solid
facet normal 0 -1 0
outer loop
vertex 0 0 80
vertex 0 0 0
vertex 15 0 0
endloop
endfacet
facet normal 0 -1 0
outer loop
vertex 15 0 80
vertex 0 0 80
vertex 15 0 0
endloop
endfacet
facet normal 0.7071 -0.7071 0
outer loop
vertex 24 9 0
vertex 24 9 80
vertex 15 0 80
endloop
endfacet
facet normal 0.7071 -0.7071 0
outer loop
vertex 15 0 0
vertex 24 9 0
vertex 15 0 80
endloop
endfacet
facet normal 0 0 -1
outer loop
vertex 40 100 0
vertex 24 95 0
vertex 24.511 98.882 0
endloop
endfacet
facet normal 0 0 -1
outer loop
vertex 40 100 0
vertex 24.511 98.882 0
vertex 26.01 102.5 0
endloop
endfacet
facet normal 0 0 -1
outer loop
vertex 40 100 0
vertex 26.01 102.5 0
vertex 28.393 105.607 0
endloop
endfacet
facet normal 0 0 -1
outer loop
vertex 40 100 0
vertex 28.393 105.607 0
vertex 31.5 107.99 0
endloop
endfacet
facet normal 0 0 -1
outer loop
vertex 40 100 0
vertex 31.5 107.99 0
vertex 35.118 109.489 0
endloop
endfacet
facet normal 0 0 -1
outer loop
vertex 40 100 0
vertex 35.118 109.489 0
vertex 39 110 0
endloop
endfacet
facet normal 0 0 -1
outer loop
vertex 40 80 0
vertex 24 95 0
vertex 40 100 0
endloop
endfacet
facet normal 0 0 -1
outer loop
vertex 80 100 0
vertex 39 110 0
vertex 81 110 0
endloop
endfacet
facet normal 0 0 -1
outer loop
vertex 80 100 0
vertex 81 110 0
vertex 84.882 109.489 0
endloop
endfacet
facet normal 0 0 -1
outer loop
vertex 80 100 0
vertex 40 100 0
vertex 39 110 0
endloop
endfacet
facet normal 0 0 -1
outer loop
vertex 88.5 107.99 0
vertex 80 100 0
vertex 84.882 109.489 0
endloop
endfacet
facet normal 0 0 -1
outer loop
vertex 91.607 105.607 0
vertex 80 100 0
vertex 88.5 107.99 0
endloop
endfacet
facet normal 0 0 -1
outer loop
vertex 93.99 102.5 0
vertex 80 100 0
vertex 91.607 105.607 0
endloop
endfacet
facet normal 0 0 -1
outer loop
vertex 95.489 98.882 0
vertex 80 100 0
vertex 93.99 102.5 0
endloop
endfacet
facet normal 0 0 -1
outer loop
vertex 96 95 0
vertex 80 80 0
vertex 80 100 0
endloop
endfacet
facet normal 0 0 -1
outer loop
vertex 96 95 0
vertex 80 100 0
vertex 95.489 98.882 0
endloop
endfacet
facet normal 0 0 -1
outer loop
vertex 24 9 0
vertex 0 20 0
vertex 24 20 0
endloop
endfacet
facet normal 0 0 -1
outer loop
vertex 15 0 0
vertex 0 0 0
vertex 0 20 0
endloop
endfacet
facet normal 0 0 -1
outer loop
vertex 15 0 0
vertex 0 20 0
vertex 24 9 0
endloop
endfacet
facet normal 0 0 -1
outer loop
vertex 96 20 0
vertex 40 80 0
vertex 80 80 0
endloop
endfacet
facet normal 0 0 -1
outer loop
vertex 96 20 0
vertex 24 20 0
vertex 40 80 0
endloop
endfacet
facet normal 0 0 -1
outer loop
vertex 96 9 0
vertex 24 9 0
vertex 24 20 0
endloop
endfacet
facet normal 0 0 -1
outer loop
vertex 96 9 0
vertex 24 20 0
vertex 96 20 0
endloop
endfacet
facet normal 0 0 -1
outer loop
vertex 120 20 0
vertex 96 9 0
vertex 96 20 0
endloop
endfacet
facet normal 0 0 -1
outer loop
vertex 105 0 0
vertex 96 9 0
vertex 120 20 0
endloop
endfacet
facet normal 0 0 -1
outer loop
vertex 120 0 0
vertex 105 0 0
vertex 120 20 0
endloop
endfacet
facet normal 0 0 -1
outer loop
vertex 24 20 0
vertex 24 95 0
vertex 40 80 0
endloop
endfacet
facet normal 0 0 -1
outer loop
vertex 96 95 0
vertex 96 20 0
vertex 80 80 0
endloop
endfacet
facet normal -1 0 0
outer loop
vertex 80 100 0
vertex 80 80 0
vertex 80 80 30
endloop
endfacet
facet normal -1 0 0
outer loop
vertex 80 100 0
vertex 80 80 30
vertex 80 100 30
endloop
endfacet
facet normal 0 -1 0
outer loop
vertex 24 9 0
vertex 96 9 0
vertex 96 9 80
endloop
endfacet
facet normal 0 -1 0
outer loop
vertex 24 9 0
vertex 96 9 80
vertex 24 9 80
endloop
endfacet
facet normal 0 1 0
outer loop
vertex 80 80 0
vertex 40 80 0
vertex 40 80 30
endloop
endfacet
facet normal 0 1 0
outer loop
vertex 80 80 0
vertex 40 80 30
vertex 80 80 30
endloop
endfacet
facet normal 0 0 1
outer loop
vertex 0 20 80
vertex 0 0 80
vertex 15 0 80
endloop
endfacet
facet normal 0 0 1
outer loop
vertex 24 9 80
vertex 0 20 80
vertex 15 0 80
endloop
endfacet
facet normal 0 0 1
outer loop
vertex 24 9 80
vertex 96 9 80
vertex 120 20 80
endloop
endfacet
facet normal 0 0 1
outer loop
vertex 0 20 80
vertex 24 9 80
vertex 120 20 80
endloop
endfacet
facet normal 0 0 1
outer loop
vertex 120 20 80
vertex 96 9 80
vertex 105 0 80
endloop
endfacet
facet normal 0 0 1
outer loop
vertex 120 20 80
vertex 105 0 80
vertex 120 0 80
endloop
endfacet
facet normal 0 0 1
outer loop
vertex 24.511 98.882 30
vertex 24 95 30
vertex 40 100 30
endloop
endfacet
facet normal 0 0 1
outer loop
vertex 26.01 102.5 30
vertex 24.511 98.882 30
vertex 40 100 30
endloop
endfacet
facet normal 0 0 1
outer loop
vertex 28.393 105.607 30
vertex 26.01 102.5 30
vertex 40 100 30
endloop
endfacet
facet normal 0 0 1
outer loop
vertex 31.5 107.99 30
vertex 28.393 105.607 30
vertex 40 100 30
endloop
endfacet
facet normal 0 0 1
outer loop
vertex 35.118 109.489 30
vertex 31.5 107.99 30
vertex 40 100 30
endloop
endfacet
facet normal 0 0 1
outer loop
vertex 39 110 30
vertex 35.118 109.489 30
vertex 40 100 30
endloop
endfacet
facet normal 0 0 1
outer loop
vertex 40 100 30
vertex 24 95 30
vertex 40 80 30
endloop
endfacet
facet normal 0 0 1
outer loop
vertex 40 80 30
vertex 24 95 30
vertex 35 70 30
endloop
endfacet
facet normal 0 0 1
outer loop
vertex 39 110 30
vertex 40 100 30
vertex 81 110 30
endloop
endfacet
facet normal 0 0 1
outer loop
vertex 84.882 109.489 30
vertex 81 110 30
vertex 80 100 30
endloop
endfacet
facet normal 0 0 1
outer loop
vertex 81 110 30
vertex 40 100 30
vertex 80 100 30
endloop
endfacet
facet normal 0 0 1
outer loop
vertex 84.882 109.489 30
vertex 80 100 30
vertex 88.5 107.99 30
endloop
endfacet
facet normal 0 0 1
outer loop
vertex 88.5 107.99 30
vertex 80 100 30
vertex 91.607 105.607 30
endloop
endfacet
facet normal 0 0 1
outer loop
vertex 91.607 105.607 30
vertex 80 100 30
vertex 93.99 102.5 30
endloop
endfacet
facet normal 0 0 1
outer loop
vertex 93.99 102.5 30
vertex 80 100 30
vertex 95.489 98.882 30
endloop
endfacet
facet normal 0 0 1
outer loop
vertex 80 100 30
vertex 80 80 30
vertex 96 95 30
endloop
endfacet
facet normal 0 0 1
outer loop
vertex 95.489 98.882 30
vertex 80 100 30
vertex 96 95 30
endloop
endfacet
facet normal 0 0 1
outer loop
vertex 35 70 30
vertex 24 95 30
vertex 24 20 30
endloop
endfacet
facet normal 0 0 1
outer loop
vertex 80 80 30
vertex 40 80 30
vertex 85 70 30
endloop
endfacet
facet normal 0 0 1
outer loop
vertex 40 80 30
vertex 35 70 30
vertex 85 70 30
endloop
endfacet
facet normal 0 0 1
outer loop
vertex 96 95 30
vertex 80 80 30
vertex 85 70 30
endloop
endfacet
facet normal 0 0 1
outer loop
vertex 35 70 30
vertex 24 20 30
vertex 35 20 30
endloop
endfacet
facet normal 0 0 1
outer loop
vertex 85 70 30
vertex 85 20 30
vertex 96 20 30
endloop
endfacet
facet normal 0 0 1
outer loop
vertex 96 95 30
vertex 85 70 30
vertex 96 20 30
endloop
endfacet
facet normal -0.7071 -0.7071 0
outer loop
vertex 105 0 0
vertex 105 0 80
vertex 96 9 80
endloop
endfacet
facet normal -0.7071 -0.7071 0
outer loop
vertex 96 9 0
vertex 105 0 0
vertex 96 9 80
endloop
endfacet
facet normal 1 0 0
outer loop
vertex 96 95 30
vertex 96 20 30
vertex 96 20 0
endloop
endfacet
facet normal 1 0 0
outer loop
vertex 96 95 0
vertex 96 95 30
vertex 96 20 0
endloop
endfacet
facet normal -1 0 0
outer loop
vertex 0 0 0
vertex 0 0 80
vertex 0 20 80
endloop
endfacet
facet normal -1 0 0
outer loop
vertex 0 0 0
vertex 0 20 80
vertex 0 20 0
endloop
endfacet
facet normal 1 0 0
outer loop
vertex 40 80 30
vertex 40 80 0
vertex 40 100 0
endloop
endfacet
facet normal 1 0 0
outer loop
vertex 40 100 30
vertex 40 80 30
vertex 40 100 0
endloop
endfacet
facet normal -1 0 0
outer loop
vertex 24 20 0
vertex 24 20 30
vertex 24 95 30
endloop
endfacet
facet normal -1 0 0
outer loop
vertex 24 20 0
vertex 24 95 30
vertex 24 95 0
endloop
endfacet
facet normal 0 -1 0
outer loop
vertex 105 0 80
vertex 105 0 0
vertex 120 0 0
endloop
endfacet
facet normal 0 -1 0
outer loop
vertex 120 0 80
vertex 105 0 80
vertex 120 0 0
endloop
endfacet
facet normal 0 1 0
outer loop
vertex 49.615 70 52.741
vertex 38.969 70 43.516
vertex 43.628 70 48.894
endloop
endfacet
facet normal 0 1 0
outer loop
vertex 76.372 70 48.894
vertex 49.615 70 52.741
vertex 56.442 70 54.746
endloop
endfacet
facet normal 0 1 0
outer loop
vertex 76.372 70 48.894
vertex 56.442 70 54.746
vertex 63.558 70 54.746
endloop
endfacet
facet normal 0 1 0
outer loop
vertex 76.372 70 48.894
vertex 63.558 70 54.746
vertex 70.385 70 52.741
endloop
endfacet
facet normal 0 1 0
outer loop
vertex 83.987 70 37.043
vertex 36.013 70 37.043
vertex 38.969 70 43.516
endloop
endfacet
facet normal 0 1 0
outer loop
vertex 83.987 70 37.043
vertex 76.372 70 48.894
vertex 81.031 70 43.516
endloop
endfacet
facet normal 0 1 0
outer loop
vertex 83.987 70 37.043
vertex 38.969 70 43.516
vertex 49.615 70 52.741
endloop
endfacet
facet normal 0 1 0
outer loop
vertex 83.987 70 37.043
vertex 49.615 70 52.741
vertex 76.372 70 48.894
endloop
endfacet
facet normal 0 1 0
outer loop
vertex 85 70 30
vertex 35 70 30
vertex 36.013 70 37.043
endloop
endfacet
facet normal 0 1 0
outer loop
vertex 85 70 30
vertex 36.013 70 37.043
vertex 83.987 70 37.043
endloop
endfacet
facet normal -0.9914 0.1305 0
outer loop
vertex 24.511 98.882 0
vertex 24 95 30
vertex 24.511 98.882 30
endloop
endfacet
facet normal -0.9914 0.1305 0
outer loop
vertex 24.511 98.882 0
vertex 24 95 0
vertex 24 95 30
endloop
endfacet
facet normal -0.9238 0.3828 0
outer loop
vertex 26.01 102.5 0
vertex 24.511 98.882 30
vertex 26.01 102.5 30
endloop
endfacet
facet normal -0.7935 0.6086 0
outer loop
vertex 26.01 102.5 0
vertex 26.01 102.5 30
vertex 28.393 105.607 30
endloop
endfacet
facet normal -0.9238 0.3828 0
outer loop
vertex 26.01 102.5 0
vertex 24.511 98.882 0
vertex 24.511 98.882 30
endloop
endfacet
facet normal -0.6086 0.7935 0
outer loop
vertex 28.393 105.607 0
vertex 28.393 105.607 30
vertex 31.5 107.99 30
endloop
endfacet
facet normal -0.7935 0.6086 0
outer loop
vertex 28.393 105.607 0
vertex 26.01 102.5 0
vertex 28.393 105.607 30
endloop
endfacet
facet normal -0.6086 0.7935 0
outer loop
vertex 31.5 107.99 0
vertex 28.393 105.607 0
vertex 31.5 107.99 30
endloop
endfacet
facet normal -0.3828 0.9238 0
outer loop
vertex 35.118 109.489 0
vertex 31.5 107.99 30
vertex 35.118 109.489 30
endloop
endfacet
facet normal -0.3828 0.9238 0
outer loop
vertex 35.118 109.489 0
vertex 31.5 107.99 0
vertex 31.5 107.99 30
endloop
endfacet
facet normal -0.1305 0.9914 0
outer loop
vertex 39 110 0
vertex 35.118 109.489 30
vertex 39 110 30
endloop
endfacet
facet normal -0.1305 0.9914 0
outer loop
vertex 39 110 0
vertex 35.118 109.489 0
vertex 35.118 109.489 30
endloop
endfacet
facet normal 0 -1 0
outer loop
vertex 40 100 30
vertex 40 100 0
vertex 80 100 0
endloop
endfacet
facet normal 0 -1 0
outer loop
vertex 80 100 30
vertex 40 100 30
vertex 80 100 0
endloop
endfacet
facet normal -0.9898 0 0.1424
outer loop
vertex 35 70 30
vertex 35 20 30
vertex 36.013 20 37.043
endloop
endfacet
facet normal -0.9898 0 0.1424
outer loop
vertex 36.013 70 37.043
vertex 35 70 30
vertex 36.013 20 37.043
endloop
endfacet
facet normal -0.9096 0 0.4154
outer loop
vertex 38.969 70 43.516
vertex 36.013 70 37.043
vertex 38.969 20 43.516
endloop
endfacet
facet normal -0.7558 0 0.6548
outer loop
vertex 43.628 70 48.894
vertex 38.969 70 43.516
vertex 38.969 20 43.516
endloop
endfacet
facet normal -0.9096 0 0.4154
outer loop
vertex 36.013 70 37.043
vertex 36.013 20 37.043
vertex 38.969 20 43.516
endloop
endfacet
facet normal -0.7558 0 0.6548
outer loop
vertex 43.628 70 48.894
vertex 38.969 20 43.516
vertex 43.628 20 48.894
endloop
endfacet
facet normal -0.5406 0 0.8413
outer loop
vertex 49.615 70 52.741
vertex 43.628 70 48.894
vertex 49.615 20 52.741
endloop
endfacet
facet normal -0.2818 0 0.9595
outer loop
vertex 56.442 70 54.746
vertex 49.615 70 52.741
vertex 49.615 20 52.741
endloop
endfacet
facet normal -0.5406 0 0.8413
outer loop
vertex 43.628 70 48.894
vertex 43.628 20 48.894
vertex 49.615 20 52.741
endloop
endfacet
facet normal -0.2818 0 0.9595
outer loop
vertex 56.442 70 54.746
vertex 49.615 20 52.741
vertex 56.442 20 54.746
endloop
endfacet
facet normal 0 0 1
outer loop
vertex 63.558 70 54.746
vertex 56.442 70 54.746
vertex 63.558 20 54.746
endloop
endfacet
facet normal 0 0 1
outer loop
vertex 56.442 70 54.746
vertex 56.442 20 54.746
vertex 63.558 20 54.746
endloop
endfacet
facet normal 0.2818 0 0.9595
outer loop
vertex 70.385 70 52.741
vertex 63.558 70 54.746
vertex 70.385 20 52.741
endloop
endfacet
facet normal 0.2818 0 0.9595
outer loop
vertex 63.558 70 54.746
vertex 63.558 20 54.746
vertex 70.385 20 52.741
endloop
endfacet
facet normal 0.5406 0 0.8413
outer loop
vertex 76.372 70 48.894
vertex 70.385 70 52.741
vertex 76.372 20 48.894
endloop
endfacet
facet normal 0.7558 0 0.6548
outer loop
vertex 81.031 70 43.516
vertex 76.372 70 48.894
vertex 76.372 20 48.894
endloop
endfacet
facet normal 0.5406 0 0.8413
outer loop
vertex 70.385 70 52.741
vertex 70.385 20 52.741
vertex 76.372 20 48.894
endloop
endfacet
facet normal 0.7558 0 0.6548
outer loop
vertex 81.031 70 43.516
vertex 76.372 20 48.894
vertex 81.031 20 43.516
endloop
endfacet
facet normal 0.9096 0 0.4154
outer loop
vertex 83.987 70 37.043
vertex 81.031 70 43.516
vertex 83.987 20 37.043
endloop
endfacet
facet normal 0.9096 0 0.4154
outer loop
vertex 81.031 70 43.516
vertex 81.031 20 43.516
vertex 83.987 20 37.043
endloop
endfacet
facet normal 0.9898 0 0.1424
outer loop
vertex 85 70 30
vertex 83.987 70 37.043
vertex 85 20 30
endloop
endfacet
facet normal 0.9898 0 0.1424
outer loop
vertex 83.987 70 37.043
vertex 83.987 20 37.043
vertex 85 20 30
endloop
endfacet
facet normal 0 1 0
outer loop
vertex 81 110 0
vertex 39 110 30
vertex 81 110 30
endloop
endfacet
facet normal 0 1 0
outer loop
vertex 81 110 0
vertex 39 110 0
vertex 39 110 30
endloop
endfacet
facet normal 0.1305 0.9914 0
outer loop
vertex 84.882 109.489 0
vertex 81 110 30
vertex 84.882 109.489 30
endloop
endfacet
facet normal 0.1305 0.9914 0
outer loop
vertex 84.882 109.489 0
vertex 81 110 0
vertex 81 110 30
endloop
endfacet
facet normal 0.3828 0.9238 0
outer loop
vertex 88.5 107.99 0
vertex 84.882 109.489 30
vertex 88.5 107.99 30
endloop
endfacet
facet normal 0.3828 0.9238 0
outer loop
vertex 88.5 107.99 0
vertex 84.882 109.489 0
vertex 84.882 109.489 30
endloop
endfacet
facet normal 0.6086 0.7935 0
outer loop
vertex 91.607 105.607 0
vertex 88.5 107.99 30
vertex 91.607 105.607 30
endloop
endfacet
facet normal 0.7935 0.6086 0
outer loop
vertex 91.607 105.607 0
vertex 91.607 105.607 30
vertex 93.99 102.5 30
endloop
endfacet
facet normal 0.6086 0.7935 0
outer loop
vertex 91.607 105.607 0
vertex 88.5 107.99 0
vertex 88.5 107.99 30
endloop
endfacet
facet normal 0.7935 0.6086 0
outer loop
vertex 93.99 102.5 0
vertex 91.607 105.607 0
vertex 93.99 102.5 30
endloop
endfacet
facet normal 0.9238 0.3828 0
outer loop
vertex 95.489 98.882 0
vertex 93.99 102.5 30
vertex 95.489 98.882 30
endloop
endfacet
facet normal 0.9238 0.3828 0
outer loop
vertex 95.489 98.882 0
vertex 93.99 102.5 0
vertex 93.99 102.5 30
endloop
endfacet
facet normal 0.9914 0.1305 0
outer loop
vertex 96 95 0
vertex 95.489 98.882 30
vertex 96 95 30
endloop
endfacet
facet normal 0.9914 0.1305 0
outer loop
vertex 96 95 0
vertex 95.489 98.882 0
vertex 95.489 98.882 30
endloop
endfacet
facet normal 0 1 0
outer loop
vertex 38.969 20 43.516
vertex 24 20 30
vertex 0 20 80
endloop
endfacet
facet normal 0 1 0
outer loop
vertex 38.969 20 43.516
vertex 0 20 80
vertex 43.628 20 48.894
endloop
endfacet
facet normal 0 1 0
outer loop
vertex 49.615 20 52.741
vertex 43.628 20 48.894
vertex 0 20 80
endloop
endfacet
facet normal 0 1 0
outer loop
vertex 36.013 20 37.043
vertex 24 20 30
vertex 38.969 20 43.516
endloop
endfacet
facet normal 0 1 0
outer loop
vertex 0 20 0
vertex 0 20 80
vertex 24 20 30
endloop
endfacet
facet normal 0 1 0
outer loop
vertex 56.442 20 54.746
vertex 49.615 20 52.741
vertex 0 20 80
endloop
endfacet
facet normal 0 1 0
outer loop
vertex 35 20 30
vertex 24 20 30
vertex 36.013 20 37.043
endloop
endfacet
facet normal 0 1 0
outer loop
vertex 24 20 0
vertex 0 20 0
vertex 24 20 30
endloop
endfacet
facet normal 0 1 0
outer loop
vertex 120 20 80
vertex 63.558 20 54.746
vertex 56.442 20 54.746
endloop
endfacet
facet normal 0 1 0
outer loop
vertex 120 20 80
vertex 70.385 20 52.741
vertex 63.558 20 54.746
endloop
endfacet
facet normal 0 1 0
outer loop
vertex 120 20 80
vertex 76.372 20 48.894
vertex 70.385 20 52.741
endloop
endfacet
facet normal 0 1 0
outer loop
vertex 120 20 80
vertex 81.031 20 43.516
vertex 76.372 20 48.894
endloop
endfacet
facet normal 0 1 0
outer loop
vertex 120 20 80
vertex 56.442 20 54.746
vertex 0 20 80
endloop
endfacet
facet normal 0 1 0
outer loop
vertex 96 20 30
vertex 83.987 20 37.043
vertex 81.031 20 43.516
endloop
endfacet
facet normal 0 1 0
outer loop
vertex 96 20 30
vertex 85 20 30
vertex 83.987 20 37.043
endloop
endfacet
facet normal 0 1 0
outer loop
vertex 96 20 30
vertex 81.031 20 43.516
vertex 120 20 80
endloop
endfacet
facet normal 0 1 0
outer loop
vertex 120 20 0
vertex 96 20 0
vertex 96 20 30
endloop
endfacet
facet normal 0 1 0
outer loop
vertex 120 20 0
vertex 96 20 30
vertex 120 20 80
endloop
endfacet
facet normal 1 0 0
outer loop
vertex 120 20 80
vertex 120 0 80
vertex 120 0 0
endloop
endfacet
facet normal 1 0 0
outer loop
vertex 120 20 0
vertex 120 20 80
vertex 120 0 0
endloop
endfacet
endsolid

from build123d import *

# Parameters (mm, degrees)
SKETCH_1_W               = 120
SKETCH_1_H               = 80
EXTRUDE_1_DEPTH          = 20
CUT_EXTRUDE_1_DEPTH      = 146.602197786
CUT_EXTRUDE_1_DEPTH_BACK = 146.602197786
SKETCH_3_W               = 72
SKETCH_3_H               = 30
EXTRUDE_2_DEPTH          = 90
EXTRUDE_3_DEPTH          = 50
FILLET_1_R               = 15
CUT_EXTRUDE_2_DEPTH      = 171.293863659
CUT_EXTRUDE_2_DEPTH_BACK = 171.293863659
SKETCH_5_W               = 40
SKETCH_5_H               = 20


with BuildPart() as part:
    # 草图1 → 凸台-拉伸1 (new body)
    with BuildSketch(Plane(origin=(0, 0, 0), x_dir=(1, 0, 0), z_dir=(0, 1, 0))):
        with Locations((60, -40)):
            Rectangle(SKETCH_1_W, SKETCH_1_H)
    extrude(amount=EXTRUDE_1_DEPTH)

    # 草图2 → 切除-拉伸1 (cut, two sides: drawn at the far end of the back side and taken through both)
    with BuildSketch(Plane.XY.offset(80).offset(-CUT_EXTRUDE_1_DEPTH_BACK)):
        Polygon((60, 0), (105, 0), (96, 9), (57.005784519, 9), (24, 9), (15, 0), align=None)
    extrude(amount=CUT_EXTRUDE_1_DEPTH + CUT_EXTRUDE_1_DEPTH_BACK, mode=Mode.SUBTRACT)

    # 草图3 → 凸台-拉伸2 (add)
    with BuildSketch(Plane(origin=(0, 20, 0), x_dir=(1, 0, 0), z_dir=(0, 1, 0))):
        with Locations((60, -15)):
            Rectangle(SKETCH_3_W, SKETCH_3_H)
    extrude(amount=EXTRUDE_2_DEPTH)

    # 草图3<3> → 凸台-拉伸3 (add)
    with BuildSketch(Plane(origin=(0, 20, 0), x_dir=(1, 0, 0), z_dir=(0, 1, 0))):
        with BuildLine():
            Line((80, -30), (60, -30))
            Line((60, -30), (49.673358607, -30))
            Line((49.673358607, -30), (40, -30))
            Line((40, -30), (35, -30))
            ThreePointArc((35, -30), (60, -55), (85, -30))
            Line((85, -30), (80, -30))
        make_face()
    extrude(amount=EXTRUDE_3_DEPTH)

    # 圆角1
    fillet_1_edges = [part.edges().sort_by_distance(p)[0] for p in [
        (96, 110, 15),
        (24, 110, 15),
    ]]
    fillet(fillet_1_edges, radius=FILLET_1_R)

    # 草图5 → 切除-拉伸2 (cut, two sides: drawn at the far end of the back side and taken through both)
    with BuildSketch(Plane.XY.offset(30).offset(-CUT_EXTRUDE_2_DEPTH_BACK)):
        with Locations((60, 90)):
            Rectangle(SKETCH_5_W, SKETCH_5_H)
    extrude(amount=CUT_EXTRUDE_2_DEPTH + CUT_EXTRUDE_2_DEPTH_BACK, mode=Mode.SUBTRACT)


solid = part.part
